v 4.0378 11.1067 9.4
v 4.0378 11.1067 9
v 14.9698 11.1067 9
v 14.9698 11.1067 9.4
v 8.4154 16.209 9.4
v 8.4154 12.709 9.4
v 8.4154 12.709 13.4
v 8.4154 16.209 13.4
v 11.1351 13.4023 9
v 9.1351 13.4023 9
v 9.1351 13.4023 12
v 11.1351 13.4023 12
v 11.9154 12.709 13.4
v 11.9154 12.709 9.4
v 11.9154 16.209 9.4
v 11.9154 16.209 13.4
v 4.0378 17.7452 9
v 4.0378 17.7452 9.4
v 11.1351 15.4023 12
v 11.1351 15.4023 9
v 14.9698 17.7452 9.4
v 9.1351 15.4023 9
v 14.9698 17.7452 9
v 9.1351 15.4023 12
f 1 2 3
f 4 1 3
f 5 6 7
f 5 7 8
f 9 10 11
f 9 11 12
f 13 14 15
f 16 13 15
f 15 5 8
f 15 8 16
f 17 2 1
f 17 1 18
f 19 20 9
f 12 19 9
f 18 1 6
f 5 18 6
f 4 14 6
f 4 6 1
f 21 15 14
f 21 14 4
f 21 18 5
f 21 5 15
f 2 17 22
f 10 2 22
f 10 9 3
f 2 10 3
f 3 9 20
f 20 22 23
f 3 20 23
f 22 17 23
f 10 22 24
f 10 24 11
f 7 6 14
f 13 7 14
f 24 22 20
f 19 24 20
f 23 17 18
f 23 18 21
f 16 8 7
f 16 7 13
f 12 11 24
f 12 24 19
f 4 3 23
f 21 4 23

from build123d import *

# Parameters (mm, degrees)
SKETCH015_W     = 10.932014
SKETCH015_H     = 6.638581
PAD007_DEPTH    = 0.4
SKETCH016_W     = 3.5
SKETCH016_H     = 3.5
PAD008_DEPTH    = 4
SKETCH017_W     = 2
SKETCH017_H     = 2
POCKET008_DEPTH = 3


with BuildPart() as part:
    # Sketch015 → Pad007 (new body)
    with BuildSketch(Plane.XY.offset(13)):
        with Locations((9.503802, 14.425956)):
            Rectangle(SKETCH015_W, SKETCH015_H)
    extrude(amount=PAD007_DEPTH)

    # Sketch016 (on Face6 of Pad007) → Pad008 (join)
    with BuildSketch(Plane.XY.offset(13.4)):
        with Locations((10.165375, 14.45904)):
            Rectangle(SKETCH016_W, SKETCH016_H)
    extrude(amount=PAD008_DEPTH)

    # Sketch017 (on Face4 of Pad008) → Pocket008 (cut)
    with BuildSketch(Plane(origin=(0, 0, 13), x_dir=(1, 0, 0), z_dir=(0, 0, -1))):
        with Locations((10.13506, -14.402274)):
            Rectangle(SKETCH017_W, SKETCH017_H)
    extrude(amount=-POCKET008_DEPTH, mode=Mode.SUBTRACT)


with BuildPart() as part_1:
    # Body006 placement: moved
    add(part.part.moved(Location((0, 0, -4))))


solid = part_1.part
